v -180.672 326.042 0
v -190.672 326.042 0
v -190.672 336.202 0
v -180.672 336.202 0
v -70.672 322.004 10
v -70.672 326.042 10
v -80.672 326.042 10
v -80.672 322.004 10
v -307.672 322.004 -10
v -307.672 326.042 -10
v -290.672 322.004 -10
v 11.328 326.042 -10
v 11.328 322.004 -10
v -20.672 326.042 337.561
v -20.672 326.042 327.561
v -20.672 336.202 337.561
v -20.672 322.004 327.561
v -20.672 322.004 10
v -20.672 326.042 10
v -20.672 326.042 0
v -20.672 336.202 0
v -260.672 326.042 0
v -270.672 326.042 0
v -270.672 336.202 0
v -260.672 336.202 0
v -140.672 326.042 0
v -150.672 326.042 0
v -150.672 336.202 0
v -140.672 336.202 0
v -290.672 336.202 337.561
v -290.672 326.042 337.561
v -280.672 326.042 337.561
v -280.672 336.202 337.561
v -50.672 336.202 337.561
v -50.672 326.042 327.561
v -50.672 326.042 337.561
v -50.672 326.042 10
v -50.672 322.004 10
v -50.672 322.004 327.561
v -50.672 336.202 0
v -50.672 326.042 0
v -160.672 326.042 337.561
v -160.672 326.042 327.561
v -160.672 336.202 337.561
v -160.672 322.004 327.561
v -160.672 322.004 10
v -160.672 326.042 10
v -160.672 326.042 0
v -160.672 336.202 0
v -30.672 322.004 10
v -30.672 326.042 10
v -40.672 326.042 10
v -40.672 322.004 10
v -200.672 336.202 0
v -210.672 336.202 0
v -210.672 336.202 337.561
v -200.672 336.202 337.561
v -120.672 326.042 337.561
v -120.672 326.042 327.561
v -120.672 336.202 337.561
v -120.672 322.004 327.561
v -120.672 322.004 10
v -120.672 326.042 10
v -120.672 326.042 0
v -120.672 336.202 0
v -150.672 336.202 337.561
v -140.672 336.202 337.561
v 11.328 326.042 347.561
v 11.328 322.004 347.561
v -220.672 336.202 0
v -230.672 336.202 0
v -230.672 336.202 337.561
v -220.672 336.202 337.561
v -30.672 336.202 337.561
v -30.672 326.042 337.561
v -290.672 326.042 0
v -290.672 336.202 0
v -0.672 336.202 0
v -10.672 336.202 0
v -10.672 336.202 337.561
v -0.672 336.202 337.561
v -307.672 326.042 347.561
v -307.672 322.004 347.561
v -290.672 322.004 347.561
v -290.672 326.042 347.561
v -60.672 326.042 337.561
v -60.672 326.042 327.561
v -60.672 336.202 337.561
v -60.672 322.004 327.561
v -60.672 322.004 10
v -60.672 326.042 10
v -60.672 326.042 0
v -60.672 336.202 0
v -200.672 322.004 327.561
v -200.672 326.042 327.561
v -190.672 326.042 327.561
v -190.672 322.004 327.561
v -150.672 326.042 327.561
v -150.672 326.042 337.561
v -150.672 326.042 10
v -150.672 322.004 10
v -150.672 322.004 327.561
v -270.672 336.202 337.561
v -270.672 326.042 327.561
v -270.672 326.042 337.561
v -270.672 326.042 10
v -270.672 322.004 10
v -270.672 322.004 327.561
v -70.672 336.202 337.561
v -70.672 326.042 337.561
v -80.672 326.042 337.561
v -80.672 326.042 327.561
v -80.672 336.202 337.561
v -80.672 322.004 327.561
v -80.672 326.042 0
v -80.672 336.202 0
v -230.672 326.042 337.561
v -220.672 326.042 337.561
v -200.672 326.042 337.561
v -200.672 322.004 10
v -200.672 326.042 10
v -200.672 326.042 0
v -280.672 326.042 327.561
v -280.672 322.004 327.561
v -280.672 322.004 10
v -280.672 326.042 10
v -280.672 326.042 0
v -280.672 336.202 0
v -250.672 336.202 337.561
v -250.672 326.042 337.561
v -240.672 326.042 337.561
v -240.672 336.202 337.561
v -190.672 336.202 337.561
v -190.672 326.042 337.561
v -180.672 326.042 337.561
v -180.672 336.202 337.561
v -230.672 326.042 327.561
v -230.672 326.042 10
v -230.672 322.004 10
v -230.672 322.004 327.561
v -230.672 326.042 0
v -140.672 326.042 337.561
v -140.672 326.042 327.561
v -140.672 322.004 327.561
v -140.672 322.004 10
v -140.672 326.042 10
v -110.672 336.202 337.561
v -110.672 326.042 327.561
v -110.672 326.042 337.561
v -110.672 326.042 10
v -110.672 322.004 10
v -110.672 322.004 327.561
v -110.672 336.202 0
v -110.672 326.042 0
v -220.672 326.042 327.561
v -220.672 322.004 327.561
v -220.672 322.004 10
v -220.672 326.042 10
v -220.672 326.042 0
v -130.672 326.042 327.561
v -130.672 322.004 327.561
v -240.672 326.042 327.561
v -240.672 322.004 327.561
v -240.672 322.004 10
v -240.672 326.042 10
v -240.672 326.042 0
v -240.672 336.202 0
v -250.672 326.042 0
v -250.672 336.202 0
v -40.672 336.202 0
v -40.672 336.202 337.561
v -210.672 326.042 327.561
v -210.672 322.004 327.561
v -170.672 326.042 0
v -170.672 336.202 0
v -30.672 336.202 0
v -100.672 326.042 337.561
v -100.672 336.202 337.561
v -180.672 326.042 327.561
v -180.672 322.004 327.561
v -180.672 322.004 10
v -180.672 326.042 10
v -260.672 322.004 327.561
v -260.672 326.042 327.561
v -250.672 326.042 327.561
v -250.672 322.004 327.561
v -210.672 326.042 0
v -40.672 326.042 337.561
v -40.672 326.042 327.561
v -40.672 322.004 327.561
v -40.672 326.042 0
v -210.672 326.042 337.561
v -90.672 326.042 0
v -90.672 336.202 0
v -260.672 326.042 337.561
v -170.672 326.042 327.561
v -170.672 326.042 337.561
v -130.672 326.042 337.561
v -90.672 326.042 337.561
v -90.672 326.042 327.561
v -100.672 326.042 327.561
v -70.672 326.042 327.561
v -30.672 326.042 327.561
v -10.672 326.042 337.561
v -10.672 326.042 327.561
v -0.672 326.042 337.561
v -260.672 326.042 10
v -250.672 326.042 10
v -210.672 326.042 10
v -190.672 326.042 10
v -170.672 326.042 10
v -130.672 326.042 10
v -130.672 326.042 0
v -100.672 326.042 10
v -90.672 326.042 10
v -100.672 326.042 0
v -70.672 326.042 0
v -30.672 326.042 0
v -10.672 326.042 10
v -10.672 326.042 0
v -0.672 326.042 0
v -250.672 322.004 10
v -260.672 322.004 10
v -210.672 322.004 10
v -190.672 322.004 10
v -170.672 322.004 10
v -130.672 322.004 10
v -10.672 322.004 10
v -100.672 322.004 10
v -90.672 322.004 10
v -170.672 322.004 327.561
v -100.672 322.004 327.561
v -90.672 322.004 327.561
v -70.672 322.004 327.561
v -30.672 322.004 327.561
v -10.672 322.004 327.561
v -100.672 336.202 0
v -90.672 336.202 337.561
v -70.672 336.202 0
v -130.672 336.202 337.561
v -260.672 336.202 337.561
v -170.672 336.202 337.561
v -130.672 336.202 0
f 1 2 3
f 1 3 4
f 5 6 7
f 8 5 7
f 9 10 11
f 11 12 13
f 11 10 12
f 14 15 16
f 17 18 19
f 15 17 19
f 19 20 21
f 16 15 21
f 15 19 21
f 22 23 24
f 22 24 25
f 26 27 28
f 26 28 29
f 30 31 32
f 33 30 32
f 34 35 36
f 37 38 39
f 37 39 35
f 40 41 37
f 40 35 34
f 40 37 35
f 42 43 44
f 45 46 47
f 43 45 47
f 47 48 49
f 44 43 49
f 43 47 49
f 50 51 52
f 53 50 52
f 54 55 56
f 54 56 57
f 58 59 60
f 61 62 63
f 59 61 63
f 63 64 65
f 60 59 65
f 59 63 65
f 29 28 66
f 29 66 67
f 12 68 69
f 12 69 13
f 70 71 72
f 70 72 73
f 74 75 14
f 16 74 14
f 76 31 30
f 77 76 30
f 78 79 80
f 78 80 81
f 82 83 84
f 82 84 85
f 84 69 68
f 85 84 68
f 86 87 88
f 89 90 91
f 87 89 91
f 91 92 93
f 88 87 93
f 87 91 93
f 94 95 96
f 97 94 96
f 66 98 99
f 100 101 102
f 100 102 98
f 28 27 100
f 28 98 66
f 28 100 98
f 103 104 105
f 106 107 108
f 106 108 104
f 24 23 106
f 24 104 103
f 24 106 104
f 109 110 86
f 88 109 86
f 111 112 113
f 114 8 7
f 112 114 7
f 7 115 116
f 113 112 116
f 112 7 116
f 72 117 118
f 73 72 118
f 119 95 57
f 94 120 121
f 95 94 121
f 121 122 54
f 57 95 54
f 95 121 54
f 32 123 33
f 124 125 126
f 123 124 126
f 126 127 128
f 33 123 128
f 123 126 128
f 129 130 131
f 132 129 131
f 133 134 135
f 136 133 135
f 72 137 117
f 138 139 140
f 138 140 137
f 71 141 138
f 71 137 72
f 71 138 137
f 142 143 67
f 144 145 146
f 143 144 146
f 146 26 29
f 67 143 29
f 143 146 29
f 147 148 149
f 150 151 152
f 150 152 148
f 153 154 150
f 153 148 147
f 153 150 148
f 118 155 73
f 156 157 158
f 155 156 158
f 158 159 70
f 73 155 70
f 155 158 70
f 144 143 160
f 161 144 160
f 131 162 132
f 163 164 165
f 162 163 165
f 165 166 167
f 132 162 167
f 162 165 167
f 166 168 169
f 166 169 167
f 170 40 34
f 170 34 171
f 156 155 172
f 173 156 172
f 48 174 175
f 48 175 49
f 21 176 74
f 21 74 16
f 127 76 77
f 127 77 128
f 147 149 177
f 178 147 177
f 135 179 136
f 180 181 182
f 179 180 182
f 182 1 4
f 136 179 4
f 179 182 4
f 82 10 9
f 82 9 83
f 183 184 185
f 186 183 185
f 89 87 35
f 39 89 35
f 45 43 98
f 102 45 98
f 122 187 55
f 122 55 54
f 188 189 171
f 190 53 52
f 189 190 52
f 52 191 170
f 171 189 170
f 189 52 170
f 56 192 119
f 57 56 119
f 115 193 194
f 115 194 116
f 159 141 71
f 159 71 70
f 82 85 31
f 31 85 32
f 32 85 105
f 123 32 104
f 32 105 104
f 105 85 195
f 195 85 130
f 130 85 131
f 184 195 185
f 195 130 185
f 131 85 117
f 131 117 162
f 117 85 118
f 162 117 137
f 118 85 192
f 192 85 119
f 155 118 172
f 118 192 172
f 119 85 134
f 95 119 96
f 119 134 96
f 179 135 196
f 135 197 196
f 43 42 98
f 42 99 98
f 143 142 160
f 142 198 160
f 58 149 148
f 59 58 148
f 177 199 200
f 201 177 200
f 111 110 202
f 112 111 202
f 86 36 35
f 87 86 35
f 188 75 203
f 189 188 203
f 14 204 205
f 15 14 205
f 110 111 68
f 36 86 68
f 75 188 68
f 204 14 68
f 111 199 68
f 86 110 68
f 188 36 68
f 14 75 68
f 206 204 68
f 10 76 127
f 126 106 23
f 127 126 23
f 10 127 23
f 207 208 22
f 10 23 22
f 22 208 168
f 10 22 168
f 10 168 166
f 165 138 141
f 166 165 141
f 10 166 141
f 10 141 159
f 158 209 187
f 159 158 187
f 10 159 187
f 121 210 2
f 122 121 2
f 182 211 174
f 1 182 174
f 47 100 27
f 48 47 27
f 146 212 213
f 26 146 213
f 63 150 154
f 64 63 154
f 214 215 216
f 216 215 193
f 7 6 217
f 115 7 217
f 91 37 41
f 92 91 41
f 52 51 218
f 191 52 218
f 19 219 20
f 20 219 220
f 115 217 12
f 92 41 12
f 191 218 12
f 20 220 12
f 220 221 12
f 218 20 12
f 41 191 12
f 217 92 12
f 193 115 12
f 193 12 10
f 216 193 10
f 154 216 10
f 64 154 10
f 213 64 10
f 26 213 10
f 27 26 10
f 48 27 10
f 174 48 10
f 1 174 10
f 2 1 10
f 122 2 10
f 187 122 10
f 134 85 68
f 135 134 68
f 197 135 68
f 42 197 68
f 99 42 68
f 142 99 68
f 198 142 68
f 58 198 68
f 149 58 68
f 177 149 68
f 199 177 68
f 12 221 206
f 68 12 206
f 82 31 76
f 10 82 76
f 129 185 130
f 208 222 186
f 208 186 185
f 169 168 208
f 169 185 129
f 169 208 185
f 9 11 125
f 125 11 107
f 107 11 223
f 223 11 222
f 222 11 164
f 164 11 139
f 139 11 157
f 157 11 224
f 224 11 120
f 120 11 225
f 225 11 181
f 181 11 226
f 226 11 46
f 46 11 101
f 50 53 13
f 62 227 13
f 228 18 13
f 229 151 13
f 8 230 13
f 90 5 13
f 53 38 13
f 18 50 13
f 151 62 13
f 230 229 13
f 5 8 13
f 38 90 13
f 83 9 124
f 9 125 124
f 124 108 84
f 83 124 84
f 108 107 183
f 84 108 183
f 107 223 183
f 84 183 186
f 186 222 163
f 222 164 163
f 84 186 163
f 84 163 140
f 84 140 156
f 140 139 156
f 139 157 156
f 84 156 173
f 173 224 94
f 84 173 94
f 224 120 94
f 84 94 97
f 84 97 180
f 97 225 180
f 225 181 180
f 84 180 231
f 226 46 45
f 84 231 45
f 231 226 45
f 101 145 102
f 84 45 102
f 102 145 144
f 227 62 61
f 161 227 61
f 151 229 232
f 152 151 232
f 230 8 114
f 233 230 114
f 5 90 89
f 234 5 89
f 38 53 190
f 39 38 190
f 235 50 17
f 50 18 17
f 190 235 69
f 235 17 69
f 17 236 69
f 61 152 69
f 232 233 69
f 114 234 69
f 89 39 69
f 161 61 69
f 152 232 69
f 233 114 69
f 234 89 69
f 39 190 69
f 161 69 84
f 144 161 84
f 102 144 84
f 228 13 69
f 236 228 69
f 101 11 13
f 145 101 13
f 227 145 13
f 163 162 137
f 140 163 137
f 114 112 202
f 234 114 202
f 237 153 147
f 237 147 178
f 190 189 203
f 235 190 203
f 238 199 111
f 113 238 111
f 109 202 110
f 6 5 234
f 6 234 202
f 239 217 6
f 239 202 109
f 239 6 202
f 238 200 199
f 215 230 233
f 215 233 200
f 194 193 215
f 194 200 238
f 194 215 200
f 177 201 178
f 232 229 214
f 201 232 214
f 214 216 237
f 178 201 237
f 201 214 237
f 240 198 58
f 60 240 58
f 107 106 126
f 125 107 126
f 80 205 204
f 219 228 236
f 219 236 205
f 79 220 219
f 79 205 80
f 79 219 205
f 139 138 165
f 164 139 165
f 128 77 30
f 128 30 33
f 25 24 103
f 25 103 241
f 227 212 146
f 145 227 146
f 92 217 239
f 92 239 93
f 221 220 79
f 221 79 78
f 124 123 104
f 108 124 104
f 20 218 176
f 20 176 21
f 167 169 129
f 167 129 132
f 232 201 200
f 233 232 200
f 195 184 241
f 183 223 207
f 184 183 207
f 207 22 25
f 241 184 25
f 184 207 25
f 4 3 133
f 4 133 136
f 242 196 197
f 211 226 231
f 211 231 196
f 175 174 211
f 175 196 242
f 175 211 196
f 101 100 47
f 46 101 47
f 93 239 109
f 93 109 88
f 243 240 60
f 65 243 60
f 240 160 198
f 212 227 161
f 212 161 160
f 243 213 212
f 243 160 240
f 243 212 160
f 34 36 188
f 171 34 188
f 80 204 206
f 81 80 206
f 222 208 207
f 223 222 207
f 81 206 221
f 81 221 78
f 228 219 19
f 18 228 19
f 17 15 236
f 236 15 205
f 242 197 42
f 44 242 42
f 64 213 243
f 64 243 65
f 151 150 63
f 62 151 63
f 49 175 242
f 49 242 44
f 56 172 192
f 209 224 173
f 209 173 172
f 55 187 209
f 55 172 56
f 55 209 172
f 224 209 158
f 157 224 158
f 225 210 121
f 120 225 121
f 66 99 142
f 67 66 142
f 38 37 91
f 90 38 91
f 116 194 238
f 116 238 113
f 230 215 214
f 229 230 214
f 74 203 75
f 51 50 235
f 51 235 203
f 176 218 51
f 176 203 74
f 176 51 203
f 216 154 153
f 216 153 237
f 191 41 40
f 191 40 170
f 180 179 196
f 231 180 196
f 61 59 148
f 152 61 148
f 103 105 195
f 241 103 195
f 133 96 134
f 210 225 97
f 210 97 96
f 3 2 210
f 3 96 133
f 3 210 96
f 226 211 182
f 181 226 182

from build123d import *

# Parameters (mm, degrees)
SKETCH1_W                = 10
SKETCH1_H                = 14.198074023
BOSS_EXTRUDE1_DEPTH      = 337.560694
BOSS_EXTRUDE1_2_DEPTH    = 337.560694
BOSS_EXTRUDE1_3_DEPTH    = 337.560694
BOSS_EXTRUDE1_4_DEPTH    = 337.560694
BOSS_EXTRUDE1_5_DEPTH    = 337.560694
BOSS_EXTRUDE1_6_DEPTH    = 337.560694
BOSS_EXTRUDE1_7_DEPTH    = 337.560694
BOSS_EXTRUDE1_8_DEPTH    = 337.560694
BOSS_EXTRUDE1_9_DEPTH    = 337.560694
BOSS_EXTRUDE1_10_DEPTH   = 337.560694
BOSS_EXTRUDE1_11_DEPTH   = 337.560694
BOSS_EXTRUDE1_12_DEPTH   = 337.560694
BOSS_EXTRUDE1_13_DEPTH   = 337.560694
BOSS_EXTRUDE1_14_DEPTH   = 337.560694
BOSS_EXTRUDE1_15_DEPTH   = 337.560694
SKETCH2_W                = 290
SKETCH2_H                = 4.038074023
BOSS_EXTRUDE2_DEPTH      = 10
BOSS_EXTRUDE2_DEPTH_BACK = 10
SKETCH3_W                = 290
SKETCH3_H                = 4.038074023
BOSS_EXTRUDE3_DEPTH      = 10
BOSS_EXTRUDE3_DEPTH_BACK = 10
SKETCH4_W                = 357.560693512
SKETCH4_H                = 4.038074023
BOSS_EXTRUDE4_DEPTH      = 12
BOSS_EXTRUDE6_DEPTH      = 17


with BuildPart() as part:
    # Sketch1 → Boss-Extrude1 (new body)
    with BuildSketch(Plane.XY):
        with Locations((-5.671527203, 329.103441202)):
            Rectangle(SKETCH1_W, SKETCH1_H)
    extrude(amount=BOSS_EXTRUDE1_DEPTH)



with BuildPart() as body_2:
    # Sketch1 → Boss-Extrude1 2 (new body)
    with BuildSketch(Plane.XY):
        with Locations((-25.671527203, 329.103441202)):
            Rectangle(SKETCH1_W, SKETCH1_H)
    extrude(amount=BOSS_EXTRUDE1_2_DEPTH)


with BuildPart() as body_3:
    # Sketch1 → Boss-Extrude1 3 (new body)
    with BuildSketch(Plane.XY):
        with Locations((-45.671527203, 329.103441202)):
            Rectangle(SKETCH1_W, SKETCH1_H)
    extrude(amount=BOSS_EXTRUDE1_3_DEPTH)


with BuildPart() as body_4:
    # Sketch1 → Boss-Extrude1 4 (new body)
    with BuildSketch(Plane.XY):
        with Locations((-65.671527203, 329.103441202)):
            Rectangle(SKETCH1_W, SKETCH1_H)
    extrude(amount=BOSS_EXTRUDE1_4_DEPTH)


with BuildPart() as body_5:
    # Sketch1 → Boss-Extrude1 5 (new body)
    with BuildSketch(Plane.XY):
        with Locations((-85.671527203, 329.103441202)):
            Rectangle(SKETCH1_W, SKETCH1_H)
    extrude(amount=BOSS_EXTRUDE1_5_DEPTH)


with BuildPart() as body_6:
    # Sketch1 → Boss-Extrude1 6 (new body)
    with BuildSketch(Plane.XY):
        with Locations((-105.671527203, 329.103441202)):
            Rectangle(SKETCH1_W, SKETCH1_H)
    extrude(amount=BOSS_EXTRUDE1_6_DEPTH)


with BuildPart() as body_7:
    # Sketch1 → Boss-Extrude1 7 (new body)
    with BuildSketch(Plane.XY):
        with Locations((-125.671527203, 329.103441202)):
            Rectangle(SKETCH1_W, SKETCH1_H)
    extrude(amount=BOSS_EXTRUDE1_7_DEPTH)


with BuildPart() as body_8:
    # Sketch1 → Boss-Extrude1 8 (new body)
    with BuildSketch(Plane.XY):
        with Locations((-145.671527203, 329.103441202)):
            Rectangle(SKETCH1_W, SKETCH1_H)
    extrude(amount=BOSS_EXTRUDE1_8_DEPTH)


with BuildPart() as body_9:
    # Sketch1 → Boss-Extrude1 9 (new body)
    with BuildSketch(Plane.XY):
        with Locations((-165.671527203, 329.103441202)):
            Rectangle(SKETCH1_W, SKETCH1_H)
    extrude(amount=BOSS_EXTRUDE1_9_DEPTH)


with BuildPart() as body_10:
    # Sketch1 → Boss-Extrude1 10 (new body)
    with BuildSketch(Plane.XY):
        with Locations((-185.671527203, 329.103441202)):
            Rectangle(SKETCH1_W, SKETCH1_H)
    extrude(amount=BOSS_EXTRUDE1_10_DEPTH)


with BuildPart() as body_11:
    # Sketch1 → Boss-Extrude1 11 (new body)
    with BuildSketch(Plane.XY):
        with Locations((-205.671527203, 329.103441202)):
            Rectangle(SKETCH1_W, SKETCH1_H)
    extrude(amount=BOSS_EXTRUDE1_11_DEPTH)


with BuildPart() as body_12:
    # Sketch1 → Boss-Extrude1 12 (new body)
    with BuildSketch(Plane.XY):
        with Locations((-225.671527203, 329.103441202)):
            Rectangle(SKETCH1_W, SKETCH1_H)
    extrude(amount=BOSS_EXTRUDE1_12_DEPTH)


with BuildPart() as body_13:
    # Sketch1 → Boss-Extrude1 13 (new body)
    with BuildSketch(Plane.XY):
        with Locations((-245.671527203, 329.103441202)):
            Rectangle(SKETCH1_W, SKETCH1_H)
    extrude(amount=BOSS_EXTRUDE1_13_DEPTH)


with BuildPart() as body_14:
    # Sketch1 → Boss-Extrude1 14 (new body)
    with BuildSketch(Plane.XY):
        with Locations((-265.671527203, 329.103441202)):
            Rectangle(SKETCH1_W, SKETCH1_H)
    extrude(amount=BOSS_EXTRUDE1_14_DEPTH)


with BuildPart() as body_15:
    # Sketch1 → Boss-Extrude1 15 (new body)
    with BuildSketch(Plane.XY):
        with Locations((-285.671527203, 329.103441202)):
            Rectangle(SKETCH1_W, SKETCH1_H)
    extrude(amount=BOSS_EXTRUDE1_15_DEPTH)


with BuildPart() as part_1:
    add(part.part)

    add(body_2.part)  # Boss-Extrude2 merges body 2

    add(body_3.part)  # Boss-Extrude2 merges body 3

    add(body_4.part)  # Boss-Extrude2 merges body 4

    add(body_5.part)  # Boss-Extrude2 merges body 5

    add(body_6.part)  # Boss-Extrude2 merges body 6

    add(body_7.part)  # Boss-Extrude2 merges body 7

    add(body_8.part)  # Boss-Extrude2 merges body 8

    add(body_9.part)  # Boss-Extrude2 merges body 9

    add(body_10.part)  # Boss-Extrude2 merges body 10

    add(body_11.part)  # Boss-Extrude2 merges body 11

    add(body_12.part)  # Boss-Extrude2 merges body 12

    add(body_13.part)  # Boss-Extrude2 merges body 13

    add(body_14.part)  # Boss-Extrude2 merges body 14

    add(body_15.part)  # Boss-Extrude2 merges body 15
    # Sketch2 → Boss-Extrude2 (add, two sides)
    with BuildSketch(Plane.XY.offset(337.560693512)) as boss_extrude2_sk:
        with Locations((-145.671527203, 324.023441203)):
            Rectangle(SKETCH2_W, SKETCH2_H)
    extrude(amount=BOSS_EXTRUDE2_DEPTH)
    extrude(boss_extrude2_sk.sketch, amount=-BOSS_EXTRUDE2_DEPTH_BACK)

    # Sketch3 → Boss-Extrude3 (add, two sides)
    with BuildSketch(Plane(origin=(0, 0, 0), x_dir=(-1, 0, 0), z_dir=(0, 0, -1))) as boss_extrude3_sk:
        with Locations((145.671527203, 324.023441203)):
            Rectangle(SKETCH3_W, SKETCH3_H)
    extrude(amount=BOSS_EXTRUDE3_DEPTH)
    extrude(boss_extrude3_sk.sketch, amount=-BOSS_EXTRUDE3_DEPTH_BACK)

    # Sketch4 → Boss-Extrude4 (add)
    with BuildSketch(Plane(origin=(-0.671527203, 0, 0), x_dir=(0, 0, -1), z_dir=(1, 0, 0))):
        with Locations((-168.780346756, 324.023441203)):
            Rectangle(SKETCH4_W, SKETCH4_H)
    extrude(amount=BOSS_EXTRUDE4_DEPTH)

    # Sketch5 → Boss-Extrude6 (add)
    with BuildSketch(Plane.ZY.offset(290.671527203)):
        Polygon((337.560693512, 326.042478214), (0, 326.042478214), (-10, 326.042478214), (-10, 322.004404191), (347.560693512, 322.004404191), (347.560693512, 326.042478214), align=None)
    extrude(amount=BOSS_EXTRUDE6_DEPTH)


solid = part_1.part
